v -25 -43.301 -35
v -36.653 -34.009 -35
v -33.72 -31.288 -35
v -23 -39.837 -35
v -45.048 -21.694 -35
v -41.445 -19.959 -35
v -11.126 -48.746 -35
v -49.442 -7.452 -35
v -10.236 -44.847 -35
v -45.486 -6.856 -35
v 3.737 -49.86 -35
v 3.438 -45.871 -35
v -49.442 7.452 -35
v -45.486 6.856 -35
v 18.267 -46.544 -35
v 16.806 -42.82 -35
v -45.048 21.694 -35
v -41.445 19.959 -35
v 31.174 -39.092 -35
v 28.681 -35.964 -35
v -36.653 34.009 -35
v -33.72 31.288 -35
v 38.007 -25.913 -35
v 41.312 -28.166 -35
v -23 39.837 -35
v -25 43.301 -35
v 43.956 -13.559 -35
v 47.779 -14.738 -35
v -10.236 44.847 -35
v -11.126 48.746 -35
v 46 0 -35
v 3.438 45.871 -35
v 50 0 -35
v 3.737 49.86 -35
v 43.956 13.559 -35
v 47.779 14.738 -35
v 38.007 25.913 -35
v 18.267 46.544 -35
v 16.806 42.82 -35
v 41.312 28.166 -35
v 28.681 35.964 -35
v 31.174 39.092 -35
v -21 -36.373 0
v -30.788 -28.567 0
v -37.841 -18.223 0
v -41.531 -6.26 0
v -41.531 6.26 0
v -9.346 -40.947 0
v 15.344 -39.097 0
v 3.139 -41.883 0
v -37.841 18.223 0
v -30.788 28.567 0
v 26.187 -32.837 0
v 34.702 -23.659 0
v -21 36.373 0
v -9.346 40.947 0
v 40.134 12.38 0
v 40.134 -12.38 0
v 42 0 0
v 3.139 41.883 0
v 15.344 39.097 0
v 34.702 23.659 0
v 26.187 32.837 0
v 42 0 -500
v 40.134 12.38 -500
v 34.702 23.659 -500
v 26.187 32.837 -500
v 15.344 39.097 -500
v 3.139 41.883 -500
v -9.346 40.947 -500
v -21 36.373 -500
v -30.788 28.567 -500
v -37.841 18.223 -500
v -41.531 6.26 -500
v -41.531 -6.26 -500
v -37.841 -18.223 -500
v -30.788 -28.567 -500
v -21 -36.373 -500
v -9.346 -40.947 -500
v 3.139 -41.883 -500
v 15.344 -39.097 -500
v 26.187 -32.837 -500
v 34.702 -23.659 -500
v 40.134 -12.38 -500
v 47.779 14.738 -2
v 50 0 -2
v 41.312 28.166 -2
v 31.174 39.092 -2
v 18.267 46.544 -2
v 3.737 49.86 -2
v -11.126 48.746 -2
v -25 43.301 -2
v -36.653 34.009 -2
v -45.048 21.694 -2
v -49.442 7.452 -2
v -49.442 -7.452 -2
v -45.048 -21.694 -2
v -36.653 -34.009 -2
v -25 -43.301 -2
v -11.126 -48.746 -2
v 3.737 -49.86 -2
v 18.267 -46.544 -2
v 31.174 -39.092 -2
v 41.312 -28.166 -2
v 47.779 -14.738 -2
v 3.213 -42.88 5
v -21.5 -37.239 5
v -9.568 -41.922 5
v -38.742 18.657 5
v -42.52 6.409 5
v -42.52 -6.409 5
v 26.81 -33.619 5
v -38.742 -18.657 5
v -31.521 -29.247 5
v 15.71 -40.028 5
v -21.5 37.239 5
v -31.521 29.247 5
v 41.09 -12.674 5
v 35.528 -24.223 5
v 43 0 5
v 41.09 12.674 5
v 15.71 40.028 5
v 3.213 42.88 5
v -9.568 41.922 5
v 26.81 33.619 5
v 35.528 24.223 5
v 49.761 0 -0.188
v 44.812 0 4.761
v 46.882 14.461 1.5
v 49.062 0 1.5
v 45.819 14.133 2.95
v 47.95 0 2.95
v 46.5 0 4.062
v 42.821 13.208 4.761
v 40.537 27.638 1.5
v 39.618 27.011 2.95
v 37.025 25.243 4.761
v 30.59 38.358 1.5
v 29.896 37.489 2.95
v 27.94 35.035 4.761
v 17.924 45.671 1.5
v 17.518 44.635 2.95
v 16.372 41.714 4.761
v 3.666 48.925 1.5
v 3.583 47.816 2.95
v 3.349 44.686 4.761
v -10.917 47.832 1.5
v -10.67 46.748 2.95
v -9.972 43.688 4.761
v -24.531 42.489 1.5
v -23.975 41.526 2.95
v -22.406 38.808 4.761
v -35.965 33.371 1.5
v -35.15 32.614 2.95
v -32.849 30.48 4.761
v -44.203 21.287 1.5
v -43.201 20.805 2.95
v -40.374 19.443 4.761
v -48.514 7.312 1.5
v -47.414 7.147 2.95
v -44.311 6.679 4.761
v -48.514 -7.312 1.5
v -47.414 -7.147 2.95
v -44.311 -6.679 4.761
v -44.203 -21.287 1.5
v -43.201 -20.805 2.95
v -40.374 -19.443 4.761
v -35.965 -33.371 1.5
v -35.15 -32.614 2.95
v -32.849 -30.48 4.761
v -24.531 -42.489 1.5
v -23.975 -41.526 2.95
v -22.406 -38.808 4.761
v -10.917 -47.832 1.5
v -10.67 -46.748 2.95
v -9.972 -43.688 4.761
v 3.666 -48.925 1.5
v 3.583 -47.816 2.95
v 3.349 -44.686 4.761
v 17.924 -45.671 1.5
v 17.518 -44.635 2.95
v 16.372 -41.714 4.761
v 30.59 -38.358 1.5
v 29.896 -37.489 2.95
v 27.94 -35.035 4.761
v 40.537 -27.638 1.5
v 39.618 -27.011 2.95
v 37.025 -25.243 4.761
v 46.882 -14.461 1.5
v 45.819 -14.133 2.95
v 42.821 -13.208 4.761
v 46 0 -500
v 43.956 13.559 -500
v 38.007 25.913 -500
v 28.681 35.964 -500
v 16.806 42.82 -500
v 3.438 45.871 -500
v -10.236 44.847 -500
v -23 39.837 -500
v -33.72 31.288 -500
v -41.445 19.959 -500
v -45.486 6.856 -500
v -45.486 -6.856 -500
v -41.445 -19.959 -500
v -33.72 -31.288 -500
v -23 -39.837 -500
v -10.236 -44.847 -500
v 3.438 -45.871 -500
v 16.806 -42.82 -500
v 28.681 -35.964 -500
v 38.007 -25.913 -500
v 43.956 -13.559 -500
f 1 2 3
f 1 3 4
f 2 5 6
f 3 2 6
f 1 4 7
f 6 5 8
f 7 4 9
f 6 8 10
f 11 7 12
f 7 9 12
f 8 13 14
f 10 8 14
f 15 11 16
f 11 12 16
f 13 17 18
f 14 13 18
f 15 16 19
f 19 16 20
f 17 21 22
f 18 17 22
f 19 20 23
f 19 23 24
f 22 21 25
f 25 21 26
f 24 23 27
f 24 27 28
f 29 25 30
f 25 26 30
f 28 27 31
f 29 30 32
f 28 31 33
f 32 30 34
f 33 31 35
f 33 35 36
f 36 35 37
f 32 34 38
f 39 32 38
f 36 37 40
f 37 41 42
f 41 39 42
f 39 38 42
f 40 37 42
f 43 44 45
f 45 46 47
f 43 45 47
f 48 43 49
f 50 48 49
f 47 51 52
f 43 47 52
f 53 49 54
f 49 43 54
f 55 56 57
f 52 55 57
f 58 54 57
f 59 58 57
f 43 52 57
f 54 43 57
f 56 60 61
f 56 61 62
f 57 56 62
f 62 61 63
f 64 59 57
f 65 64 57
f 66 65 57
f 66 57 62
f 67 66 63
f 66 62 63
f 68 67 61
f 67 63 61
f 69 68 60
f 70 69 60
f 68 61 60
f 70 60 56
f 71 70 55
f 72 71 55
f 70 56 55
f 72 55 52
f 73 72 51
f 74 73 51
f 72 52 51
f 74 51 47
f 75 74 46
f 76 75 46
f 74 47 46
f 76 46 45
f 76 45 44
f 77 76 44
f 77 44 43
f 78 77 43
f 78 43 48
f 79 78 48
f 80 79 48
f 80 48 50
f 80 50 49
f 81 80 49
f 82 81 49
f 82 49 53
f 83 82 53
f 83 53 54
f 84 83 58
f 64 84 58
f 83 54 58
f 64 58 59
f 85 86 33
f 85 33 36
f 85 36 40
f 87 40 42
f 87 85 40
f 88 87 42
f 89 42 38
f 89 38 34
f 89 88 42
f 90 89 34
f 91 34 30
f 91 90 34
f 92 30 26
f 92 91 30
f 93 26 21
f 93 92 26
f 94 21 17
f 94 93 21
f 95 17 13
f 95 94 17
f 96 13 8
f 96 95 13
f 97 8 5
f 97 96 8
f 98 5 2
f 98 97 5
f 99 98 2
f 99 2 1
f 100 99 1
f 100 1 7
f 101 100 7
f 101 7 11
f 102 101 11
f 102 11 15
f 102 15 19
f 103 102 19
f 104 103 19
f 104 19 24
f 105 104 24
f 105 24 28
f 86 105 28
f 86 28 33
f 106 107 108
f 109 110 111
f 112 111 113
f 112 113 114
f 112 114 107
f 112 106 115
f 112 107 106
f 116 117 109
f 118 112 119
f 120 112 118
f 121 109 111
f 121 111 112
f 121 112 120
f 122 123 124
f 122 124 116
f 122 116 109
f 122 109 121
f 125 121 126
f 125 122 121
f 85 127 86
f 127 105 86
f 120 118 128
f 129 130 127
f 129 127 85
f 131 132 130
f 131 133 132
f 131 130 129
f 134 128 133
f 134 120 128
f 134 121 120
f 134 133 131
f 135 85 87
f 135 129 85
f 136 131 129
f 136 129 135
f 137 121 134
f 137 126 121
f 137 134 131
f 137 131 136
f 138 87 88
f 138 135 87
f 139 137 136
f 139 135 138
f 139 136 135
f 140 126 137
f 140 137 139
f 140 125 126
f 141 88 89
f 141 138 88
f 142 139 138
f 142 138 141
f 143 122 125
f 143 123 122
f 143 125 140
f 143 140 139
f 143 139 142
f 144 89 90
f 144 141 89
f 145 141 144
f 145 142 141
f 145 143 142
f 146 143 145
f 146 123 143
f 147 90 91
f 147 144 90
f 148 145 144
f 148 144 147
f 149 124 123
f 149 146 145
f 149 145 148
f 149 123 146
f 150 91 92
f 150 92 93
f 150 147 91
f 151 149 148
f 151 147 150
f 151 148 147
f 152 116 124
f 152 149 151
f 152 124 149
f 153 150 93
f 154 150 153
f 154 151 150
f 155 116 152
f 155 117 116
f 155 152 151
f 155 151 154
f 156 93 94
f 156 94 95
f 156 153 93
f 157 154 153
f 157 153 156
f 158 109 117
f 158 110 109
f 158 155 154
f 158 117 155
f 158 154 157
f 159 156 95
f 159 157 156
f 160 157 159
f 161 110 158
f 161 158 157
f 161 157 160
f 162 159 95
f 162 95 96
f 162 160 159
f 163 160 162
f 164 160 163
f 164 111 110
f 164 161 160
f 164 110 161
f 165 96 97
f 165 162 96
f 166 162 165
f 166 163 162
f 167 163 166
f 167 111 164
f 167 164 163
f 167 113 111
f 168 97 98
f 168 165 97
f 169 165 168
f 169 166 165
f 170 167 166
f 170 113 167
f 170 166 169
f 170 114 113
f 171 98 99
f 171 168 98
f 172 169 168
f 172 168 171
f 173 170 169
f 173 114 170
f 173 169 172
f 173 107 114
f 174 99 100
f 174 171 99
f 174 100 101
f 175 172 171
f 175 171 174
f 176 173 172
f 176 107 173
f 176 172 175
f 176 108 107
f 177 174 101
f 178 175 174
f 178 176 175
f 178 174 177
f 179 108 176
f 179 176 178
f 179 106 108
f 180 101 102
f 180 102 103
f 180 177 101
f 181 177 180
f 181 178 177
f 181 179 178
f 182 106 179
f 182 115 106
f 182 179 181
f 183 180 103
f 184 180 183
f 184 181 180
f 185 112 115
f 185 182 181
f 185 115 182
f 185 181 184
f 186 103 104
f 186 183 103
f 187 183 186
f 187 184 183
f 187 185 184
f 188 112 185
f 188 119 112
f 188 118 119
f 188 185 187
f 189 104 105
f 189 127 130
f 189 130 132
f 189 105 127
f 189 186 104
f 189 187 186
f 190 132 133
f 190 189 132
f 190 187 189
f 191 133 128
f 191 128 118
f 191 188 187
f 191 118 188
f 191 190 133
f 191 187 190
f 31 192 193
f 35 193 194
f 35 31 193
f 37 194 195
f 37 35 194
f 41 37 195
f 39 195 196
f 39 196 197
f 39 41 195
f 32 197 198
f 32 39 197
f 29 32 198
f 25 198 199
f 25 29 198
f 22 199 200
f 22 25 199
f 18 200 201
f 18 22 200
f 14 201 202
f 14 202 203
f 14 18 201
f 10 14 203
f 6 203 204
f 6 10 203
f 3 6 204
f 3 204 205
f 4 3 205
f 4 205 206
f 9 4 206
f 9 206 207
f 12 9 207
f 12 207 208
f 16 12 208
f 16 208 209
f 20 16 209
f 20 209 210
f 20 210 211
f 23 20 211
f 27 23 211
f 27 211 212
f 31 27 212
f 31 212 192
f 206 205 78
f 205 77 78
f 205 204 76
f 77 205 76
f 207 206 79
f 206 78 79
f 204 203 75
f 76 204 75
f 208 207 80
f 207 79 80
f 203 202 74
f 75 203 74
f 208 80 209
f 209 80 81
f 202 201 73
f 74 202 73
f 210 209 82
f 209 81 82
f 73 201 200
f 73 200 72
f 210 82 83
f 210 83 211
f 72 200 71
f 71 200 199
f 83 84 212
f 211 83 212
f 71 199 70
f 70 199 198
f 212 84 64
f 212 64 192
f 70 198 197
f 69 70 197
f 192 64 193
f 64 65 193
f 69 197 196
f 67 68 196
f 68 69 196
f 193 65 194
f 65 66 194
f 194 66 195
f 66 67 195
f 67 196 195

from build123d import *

# Parameters (mm, degrees)
F0_R     = 50
F0_R_2   = 46
F0_R_3   = 42
F1_DEPTH = 5
F2_DEPTH = 500
F3_DEPTH = 35
F4_R     = 7


with BuildPart() as f1:
    # F0 (on Top) → F1 (new body)
    with BuildSketch(Plane.XY):
        Circle(F0_R)
        Circle(F0_R_2, mode=Mode.SUBTRACT)
        Circle(F0_R_2)
        Circle(F0_R_3, mode=Mode.SUBTRACT)
        Circle(F0_R_3)
    extrude(amount=F1_DEPTH)

    # F0 (on Top) → F2 (join)
    with BuildSketch(Plane.XY):
        Circle(F0_R_2)
        Circle(F0_R_3, mode=Mode.SUBTRACT)
    extrude(amount=-F2_DEPTH)

    # F0 (on Top) → F3 (join)
    with BuildSketch(Plane.XY):
        Circle(F0_R)
        Circle(F0_R_2, mode=Mode.SUBTRACT)
    extrude(amount=-F3_DEPTH)

    # F4
    f4_edges = [f1.edges().sort_by_distance(p)[0] for p in [
        (-50, 0, 5),
    ]]
    fillet(f4_edges, radius=F4_R)


solid = f1.part
